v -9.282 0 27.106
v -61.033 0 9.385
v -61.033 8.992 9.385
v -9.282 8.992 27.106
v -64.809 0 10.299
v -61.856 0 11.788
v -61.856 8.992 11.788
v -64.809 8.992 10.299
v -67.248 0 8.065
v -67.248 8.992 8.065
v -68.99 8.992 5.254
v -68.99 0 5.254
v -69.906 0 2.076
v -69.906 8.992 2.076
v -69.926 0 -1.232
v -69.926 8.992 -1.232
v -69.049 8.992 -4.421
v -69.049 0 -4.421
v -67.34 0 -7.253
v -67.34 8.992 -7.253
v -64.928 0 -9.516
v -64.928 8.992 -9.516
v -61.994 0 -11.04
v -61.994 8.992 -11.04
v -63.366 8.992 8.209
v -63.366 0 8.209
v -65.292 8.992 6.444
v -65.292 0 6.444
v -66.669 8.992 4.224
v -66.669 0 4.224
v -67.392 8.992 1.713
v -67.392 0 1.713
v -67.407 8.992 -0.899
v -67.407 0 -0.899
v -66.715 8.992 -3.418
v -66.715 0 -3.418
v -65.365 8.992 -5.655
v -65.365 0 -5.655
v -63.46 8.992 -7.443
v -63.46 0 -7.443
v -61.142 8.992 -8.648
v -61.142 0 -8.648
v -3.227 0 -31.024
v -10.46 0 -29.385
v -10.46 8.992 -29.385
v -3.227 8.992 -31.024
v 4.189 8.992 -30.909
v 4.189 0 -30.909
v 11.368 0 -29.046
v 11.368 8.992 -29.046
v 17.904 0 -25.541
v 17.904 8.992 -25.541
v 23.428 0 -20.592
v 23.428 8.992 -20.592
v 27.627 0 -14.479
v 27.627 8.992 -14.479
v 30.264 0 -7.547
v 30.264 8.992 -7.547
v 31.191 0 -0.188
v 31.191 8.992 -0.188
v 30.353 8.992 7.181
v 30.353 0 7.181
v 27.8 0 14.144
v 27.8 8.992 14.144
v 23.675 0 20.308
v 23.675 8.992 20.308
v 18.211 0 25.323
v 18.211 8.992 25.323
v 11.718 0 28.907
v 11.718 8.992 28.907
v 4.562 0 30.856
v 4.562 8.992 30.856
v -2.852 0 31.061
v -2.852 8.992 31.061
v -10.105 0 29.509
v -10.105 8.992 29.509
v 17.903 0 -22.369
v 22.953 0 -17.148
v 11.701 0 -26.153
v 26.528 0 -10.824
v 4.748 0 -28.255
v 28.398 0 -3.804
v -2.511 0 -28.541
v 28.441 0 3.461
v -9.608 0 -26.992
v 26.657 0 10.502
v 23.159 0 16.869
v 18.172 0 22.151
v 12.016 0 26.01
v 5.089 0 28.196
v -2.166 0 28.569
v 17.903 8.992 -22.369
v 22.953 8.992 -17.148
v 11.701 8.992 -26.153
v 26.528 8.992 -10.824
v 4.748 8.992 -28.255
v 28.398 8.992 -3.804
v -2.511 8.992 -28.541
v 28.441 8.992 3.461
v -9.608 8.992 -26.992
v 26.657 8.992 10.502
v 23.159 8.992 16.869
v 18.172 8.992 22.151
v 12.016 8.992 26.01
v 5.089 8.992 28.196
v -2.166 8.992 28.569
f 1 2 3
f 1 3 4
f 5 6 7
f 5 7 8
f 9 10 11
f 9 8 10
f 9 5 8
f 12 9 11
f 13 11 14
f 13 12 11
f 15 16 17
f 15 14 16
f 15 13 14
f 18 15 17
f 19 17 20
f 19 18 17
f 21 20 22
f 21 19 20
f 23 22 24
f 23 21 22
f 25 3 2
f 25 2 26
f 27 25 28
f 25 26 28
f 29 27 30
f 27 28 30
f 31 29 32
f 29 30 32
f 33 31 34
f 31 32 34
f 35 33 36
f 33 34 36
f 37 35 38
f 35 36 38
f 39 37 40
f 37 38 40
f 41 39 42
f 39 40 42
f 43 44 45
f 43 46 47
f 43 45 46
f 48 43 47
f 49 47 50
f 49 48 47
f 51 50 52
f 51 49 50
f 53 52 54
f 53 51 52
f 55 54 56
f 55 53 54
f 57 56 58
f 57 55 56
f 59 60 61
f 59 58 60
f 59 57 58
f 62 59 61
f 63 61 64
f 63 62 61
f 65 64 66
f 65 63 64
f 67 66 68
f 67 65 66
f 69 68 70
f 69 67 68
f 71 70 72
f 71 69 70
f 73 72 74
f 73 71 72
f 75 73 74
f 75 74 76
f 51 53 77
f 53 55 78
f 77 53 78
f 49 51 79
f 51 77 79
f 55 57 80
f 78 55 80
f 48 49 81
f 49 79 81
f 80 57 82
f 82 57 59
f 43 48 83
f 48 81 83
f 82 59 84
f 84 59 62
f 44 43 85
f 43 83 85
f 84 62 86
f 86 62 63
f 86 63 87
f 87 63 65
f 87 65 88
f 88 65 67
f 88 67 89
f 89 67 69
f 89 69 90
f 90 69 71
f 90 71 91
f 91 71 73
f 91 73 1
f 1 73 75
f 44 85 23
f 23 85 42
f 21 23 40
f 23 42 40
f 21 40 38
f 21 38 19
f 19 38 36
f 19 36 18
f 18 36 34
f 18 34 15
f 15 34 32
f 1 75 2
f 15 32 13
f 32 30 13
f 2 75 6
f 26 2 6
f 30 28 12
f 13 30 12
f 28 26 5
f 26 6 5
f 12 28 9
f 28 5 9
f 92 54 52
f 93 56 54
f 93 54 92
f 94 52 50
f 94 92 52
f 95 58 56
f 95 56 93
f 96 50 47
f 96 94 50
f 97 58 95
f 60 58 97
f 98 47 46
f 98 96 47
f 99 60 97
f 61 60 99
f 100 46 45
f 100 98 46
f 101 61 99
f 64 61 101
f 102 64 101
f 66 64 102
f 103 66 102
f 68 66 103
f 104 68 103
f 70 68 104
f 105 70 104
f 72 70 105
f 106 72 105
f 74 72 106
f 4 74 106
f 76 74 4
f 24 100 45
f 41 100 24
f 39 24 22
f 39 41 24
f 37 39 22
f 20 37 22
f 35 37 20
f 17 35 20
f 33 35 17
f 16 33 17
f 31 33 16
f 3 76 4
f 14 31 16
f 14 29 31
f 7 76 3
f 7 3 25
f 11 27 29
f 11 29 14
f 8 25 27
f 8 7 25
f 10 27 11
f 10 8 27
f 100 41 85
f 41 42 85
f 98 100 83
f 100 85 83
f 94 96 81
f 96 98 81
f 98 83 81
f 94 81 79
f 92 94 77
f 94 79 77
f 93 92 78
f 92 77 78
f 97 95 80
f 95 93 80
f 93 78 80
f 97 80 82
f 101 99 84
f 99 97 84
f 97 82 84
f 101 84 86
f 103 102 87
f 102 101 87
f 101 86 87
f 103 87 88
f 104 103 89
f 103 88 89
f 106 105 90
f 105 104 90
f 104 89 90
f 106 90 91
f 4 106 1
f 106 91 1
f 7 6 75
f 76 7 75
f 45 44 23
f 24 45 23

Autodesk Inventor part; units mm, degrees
ref_plane "YZ Plane" through (0, 0, 0) normal (1, 0, 0) x (0, 1, 0)
ref_plane "XZ Plane" through (0, 0, 0) normal (0, 1, 0) x (-1, 0, 0)
ref_plane "XY Plane" through (0, 0, 0) normal (0, 0, 1) x (1, 0, 0)
sketch "Sketch1" plane through (0, 0, 0) normal (0, 1, 0) x (-1, 0, 0)
  circle A0 centre (0, 0) radius 28.6512 construction
  line L0 (0, 0) -> (0, 28.6512) construction
  line L1 (0, 0) -> (57.939, 0.3498) construction
  circle A1 centre (57.939, 0.3498) radius 9.5504 construction
  line L2 (61.0329, 9.3851) -> (9.2818, 27.1061)
  line L3 (61.1418, -8.6476) -> (9.6084, -26.992)
  arc A2 (61.1418, -8.6476) -> (61.0329, 9.3851) centre (57.939, 0.3498) ccw
  arc A3 (9.2818, 27.1061) -> (9.6084, -26.992) centre (0, 0) ccw
  line L4 (10.4602, -29.3849) -> (61.9936, -11.0405)
  arc A4 (61.9936, -11.0405) -> (61.8558, 11.7882) centre (57.939, 0.3498) ccw
  line L5 (61.8558, 11.7882) -> (10.1047, 29.5091)
  arc A5 (10.1047, 29.5091) -> (10.4602, -29.3849) centre (0, 0) ccw
  dimension "d0" = 57.3024
  dimension "d1" = 57.94
  dimension "d2" = 89.654
  dimension "d3" = 19.1008
  dimension "d4" = 2.54
extrude "Extrusion1" add sketch "Sketch1" along normal blind 8.9916
properties part number "INTK_009_Belt1" material "Rubber, Silicone"
